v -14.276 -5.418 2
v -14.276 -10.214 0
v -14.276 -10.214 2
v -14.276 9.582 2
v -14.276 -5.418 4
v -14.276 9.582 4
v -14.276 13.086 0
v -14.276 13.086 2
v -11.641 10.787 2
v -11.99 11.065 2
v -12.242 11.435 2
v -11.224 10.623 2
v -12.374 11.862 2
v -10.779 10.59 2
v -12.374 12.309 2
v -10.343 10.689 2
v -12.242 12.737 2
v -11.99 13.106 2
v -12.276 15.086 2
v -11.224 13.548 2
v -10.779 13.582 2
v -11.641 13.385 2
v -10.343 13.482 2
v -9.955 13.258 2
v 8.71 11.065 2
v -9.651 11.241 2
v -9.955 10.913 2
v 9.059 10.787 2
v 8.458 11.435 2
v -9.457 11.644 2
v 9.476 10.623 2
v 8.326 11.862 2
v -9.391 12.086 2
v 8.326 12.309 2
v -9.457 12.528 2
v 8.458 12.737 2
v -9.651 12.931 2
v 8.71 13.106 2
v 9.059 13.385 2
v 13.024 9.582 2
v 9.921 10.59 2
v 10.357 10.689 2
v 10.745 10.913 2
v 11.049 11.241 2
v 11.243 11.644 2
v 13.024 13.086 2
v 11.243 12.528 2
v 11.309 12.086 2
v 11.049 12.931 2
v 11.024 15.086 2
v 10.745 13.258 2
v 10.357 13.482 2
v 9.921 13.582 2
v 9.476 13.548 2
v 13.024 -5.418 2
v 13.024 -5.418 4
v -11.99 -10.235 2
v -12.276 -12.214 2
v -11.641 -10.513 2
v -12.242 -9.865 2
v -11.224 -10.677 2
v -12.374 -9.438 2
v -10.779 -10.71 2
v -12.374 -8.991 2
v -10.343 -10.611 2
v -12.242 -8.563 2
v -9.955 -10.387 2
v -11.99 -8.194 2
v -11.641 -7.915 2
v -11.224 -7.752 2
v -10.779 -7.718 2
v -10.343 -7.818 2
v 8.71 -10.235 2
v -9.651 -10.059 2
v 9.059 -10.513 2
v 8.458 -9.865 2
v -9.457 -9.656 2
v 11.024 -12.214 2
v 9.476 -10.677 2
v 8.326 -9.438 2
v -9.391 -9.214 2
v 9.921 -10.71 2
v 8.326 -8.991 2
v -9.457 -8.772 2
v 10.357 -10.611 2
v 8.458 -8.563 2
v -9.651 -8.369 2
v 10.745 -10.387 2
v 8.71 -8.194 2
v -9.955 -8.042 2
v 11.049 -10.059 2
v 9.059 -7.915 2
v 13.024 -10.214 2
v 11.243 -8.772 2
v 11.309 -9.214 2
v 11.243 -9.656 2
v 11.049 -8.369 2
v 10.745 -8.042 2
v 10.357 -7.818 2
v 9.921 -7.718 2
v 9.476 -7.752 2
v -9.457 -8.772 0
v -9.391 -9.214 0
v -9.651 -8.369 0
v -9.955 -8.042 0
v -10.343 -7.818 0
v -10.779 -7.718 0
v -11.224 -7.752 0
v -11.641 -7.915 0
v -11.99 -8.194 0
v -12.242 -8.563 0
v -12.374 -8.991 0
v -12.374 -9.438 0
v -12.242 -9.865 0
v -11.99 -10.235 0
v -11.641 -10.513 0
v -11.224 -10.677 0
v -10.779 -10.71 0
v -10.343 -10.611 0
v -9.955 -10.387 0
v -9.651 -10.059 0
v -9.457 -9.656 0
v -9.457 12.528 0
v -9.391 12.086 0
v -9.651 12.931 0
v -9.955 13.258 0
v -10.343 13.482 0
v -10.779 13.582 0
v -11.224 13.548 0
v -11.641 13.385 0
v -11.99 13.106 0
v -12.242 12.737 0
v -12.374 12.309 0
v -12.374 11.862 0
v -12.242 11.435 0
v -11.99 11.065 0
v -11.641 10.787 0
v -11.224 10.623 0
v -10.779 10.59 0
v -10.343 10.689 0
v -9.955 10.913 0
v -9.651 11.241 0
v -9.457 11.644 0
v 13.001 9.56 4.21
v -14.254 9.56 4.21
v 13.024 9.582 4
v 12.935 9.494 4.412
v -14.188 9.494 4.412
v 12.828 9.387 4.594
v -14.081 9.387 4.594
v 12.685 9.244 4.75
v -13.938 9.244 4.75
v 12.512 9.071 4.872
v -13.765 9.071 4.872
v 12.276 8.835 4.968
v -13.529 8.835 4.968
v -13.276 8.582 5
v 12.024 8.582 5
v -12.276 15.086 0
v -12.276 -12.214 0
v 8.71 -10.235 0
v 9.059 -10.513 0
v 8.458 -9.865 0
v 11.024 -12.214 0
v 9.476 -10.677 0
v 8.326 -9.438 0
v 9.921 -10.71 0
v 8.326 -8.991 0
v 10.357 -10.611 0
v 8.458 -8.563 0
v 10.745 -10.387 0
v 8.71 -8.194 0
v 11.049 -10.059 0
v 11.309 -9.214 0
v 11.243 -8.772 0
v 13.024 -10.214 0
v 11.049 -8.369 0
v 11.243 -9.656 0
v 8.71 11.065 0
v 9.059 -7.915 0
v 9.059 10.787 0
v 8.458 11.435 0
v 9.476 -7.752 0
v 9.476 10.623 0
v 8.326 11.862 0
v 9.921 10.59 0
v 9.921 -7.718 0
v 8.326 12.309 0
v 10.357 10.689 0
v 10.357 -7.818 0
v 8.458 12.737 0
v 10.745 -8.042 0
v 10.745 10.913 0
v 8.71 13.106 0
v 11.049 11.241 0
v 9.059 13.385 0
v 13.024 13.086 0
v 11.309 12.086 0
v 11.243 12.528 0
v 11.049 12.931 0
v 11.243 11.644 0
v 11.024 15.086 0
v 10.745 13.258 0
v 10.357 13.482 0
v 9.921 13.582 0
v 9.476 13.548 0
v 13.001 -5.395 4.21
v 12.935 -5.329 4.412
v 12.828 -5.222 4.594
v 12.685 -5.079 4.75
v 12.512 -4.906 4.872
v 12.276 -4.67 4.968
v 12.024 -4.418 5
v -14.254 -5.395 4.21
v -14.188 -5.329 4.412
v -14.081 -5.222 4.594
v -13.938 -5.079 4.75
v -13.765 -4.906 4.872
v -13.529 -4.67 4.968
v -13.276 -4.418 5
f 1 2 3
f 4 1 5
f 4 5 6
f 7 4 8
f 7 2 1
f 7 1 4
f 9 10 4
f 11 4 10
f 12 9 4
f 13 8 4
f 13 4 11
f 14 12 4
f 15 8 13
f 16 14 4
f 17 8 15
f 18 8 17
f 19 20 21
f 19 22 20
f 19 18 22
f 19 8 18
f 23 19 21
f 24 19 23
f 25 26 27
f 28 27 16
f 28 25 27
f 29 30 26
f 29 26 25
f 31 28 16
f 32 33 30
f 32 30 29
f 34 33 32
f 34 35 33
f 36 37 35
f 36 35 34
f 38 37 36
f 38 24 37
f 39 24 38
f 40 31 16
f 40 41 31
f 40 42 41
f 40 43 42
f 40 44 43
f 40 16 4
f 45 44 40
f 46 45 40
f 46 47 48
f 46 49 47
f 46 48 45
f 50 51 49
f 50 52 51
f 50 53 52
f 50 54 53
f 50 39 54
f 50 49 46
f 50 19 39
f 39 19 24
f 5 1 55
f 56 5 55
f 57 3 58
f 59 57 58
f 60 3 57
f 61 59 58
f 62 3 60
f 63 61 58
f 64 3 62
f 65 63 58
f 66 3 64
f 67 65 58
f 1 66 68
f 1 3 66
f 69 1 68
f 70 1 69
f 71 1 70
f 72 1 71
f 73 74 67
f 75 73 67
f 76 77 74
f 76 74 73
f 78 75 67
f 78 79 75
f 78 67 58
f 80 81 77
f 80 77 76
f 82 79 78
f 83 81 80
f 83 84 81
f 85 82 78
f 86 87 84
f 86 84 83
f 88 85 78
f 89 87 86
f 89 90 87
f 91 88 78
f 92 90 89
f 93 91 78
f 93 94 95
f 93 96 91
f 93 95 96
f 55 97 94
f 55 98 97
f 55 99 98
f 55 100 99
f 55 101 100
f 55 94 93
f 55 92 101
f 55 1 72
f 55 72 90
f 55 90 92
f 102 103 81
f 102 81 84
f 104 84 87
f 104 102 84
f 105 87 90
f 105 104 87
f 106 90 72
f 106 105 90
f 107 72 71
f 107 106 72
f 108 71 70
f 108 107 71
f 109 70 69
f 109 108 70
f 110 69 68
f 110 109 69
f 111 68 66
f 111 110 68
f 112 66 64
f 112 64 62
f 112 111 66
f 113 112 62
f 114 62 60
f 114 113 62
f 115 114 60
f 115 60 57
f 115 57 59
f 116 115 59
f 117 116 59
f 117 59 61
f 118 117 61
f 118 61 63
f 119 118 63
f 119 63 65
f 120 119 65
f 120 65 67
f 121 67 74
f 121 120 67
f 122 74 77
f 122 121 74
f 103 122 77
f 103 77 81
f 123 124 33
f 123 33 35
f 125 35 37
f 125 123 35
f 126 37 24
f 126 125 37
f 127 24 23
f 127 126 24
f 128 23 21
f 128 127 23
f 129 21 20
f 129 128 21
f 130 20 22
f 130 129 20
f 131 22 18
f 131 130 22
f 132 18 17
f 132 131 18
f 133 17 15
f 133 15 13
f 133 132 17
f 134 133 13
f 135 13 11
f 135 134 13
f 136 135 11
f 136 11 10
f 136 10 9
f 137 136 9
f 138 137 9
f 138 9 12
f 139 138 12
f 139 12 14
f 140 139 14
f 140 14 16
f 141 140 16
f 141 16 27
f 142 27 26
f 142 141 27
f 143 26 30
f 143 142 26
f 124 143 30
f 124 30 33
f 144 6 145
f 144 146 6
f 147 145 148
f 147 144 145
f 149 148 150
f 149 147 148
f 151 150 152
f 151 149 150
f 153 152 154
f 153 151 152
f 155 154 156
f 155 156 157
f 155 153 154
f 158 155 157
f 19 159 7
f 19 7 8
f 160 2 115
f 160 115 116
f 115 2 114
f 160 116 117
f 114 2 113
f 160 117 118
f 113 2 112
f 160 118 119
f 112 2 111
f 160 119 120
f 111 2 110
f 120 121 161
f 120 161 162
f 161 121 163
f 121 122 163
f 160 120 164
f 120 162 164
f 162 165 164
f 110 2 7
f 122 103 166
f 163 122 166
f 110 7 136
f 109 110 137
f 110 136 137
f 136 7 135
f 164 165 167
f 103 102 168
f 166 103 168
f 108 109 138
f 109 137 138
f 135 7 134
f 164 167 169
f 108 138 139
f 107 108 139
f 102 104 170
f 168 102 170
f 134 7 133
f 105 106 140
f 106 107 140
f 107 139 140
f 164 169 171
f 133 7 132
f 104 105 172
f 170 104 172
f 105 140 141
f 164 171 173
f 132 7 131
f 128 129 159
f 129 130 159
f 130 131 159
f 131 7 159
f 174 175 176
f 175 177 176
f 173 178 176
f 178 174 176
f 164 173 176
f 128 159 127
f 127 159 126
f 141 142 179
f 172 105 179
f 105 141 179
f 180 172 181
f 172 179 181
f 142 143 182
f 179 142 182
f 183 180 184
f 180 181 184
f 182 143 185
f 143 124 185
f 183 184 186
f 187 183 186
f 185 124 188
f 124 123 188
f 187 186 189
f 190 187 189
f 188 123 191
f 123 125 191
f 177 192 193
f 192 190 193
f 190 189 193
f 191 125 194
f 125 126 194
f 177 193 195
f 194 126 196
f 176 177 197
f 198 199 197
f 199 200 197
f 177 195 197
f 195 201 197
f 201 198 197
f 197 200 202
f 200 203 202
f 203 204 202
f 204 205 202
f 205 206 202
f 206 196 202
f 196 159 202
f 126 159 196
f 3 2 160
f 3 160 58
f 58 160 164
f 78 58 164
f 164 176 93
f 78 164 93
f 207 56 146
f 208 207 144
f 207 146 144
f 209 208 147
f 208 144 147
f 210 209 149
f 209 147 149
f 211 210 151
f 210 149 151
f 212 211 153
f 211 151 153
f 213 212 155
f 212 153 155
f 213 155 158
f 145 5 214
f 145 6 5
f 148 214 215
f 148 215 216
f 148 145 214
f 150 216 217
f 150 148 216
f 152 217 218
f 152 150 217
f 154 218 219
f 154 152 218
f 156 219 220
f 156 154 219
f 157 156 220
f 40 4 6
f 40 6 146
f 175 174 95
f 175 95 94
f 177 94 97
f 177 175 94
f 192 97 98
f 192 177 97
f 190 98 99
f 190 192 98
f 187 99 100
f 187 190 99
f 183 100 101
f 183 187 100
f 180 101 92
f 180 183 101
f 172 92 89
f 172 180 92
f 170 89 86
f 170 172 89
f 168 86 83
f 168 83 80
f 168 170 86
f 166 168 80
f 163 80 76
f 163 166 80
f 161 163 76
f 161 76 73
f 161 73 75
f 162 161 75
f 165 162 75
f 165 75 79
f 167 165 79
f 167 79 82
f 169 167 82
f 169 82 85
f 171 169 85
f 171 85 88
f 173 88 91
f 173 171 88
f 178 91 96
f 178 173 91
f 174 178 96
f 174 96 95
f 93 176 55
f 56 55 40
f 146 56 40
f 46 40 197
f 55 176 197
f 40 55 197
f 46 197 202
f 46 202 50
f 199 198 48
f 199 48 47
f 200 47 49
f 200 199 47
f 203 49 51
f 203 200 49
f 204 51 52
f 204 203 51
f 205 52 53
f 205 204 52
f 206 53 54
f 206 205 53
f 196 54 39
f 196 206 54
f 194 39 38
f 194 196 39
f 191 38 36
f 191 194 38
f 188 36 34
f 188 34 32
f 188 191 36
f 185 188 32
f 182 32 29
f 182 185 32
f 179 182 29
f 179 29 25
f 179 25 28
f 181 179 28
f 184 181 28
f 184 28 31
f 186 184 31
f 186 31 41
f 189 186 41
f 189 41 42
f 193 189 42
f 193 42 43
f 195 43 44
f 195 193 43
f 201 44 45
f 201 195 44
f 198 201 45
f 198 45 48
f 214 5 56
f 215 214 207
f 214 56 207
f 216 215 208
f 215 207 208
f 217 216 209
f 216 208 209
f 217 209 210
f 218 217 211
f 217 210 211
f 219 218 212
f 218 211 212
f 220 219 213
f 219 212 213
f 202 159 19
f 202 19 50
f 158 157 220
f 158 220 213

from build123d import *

# Parameters (mm, degrees)
F0_W     = 27.3
F0_H     = 27.3
F0_R     = 1.5
F1_DEPTH = 2
F2_SIZE  = 2
F3_W     = 27.3
F3_H     = 15
F4_DEPTH = 3
F5_R     = 1


with BuildPart() as f1:
    # F0 (on Top) → F1 (new body)
    with BuildSketch(Plane.XY):
        with Locations((-0.626242, 1.435703)):
            Rectangle(F0_W, F0_H)
        with Locations((-10.890681, -9.214297)):
            Circle(F0_R, mode=Mode.SUBTRACT)
        with Locations((9.809319, -9.214297)):
            Circle(F0_R, mode=Mode.SUBTRACT)
        with Locations((-10.890681, 12.085703)):
            Circle(F0_R, mode=Mode.SUBTRACT)
        with Locations((9.809319, 12.085703)):
            Circle(F0_R, mode=Mode.SUBTRACT)
    extrude(amount=F1_DEPTH)

    # F2
    f2_edges = [f1.edges().sort_by_distance(p)[0] for p in [
        (13.023758, 15.085703, 1),
        (13.023758, -12.214297, 1),
        (-14.276242, -12.214297, 1),
        (-14.276242, 15.085703, 1),
    ]]
    chamfer(f2_edges, length=F2_SIZE)

    # F3 (on face) → F4 (join)
    with BuildSketch(Plane.XY.offset(2)):
        with Locations((-0.626242, 2.082483)):
            Rectangle(F3_W, F3_H)
    extrude(amount=F4_DEPTH)

    # F5
    f5_edges = [f1.edges().sort_by_distance(p)[0] for p in [
        (-0.626242, 9.582483, 5),
        (-0.626242, -5.417517, 5),
        (-14.276242, 2.082483, 5),
        (13.023758, 2.082483, 5),
    ]]
    fillet(f5_edges, radius=F5_R)


solid = f1.part
